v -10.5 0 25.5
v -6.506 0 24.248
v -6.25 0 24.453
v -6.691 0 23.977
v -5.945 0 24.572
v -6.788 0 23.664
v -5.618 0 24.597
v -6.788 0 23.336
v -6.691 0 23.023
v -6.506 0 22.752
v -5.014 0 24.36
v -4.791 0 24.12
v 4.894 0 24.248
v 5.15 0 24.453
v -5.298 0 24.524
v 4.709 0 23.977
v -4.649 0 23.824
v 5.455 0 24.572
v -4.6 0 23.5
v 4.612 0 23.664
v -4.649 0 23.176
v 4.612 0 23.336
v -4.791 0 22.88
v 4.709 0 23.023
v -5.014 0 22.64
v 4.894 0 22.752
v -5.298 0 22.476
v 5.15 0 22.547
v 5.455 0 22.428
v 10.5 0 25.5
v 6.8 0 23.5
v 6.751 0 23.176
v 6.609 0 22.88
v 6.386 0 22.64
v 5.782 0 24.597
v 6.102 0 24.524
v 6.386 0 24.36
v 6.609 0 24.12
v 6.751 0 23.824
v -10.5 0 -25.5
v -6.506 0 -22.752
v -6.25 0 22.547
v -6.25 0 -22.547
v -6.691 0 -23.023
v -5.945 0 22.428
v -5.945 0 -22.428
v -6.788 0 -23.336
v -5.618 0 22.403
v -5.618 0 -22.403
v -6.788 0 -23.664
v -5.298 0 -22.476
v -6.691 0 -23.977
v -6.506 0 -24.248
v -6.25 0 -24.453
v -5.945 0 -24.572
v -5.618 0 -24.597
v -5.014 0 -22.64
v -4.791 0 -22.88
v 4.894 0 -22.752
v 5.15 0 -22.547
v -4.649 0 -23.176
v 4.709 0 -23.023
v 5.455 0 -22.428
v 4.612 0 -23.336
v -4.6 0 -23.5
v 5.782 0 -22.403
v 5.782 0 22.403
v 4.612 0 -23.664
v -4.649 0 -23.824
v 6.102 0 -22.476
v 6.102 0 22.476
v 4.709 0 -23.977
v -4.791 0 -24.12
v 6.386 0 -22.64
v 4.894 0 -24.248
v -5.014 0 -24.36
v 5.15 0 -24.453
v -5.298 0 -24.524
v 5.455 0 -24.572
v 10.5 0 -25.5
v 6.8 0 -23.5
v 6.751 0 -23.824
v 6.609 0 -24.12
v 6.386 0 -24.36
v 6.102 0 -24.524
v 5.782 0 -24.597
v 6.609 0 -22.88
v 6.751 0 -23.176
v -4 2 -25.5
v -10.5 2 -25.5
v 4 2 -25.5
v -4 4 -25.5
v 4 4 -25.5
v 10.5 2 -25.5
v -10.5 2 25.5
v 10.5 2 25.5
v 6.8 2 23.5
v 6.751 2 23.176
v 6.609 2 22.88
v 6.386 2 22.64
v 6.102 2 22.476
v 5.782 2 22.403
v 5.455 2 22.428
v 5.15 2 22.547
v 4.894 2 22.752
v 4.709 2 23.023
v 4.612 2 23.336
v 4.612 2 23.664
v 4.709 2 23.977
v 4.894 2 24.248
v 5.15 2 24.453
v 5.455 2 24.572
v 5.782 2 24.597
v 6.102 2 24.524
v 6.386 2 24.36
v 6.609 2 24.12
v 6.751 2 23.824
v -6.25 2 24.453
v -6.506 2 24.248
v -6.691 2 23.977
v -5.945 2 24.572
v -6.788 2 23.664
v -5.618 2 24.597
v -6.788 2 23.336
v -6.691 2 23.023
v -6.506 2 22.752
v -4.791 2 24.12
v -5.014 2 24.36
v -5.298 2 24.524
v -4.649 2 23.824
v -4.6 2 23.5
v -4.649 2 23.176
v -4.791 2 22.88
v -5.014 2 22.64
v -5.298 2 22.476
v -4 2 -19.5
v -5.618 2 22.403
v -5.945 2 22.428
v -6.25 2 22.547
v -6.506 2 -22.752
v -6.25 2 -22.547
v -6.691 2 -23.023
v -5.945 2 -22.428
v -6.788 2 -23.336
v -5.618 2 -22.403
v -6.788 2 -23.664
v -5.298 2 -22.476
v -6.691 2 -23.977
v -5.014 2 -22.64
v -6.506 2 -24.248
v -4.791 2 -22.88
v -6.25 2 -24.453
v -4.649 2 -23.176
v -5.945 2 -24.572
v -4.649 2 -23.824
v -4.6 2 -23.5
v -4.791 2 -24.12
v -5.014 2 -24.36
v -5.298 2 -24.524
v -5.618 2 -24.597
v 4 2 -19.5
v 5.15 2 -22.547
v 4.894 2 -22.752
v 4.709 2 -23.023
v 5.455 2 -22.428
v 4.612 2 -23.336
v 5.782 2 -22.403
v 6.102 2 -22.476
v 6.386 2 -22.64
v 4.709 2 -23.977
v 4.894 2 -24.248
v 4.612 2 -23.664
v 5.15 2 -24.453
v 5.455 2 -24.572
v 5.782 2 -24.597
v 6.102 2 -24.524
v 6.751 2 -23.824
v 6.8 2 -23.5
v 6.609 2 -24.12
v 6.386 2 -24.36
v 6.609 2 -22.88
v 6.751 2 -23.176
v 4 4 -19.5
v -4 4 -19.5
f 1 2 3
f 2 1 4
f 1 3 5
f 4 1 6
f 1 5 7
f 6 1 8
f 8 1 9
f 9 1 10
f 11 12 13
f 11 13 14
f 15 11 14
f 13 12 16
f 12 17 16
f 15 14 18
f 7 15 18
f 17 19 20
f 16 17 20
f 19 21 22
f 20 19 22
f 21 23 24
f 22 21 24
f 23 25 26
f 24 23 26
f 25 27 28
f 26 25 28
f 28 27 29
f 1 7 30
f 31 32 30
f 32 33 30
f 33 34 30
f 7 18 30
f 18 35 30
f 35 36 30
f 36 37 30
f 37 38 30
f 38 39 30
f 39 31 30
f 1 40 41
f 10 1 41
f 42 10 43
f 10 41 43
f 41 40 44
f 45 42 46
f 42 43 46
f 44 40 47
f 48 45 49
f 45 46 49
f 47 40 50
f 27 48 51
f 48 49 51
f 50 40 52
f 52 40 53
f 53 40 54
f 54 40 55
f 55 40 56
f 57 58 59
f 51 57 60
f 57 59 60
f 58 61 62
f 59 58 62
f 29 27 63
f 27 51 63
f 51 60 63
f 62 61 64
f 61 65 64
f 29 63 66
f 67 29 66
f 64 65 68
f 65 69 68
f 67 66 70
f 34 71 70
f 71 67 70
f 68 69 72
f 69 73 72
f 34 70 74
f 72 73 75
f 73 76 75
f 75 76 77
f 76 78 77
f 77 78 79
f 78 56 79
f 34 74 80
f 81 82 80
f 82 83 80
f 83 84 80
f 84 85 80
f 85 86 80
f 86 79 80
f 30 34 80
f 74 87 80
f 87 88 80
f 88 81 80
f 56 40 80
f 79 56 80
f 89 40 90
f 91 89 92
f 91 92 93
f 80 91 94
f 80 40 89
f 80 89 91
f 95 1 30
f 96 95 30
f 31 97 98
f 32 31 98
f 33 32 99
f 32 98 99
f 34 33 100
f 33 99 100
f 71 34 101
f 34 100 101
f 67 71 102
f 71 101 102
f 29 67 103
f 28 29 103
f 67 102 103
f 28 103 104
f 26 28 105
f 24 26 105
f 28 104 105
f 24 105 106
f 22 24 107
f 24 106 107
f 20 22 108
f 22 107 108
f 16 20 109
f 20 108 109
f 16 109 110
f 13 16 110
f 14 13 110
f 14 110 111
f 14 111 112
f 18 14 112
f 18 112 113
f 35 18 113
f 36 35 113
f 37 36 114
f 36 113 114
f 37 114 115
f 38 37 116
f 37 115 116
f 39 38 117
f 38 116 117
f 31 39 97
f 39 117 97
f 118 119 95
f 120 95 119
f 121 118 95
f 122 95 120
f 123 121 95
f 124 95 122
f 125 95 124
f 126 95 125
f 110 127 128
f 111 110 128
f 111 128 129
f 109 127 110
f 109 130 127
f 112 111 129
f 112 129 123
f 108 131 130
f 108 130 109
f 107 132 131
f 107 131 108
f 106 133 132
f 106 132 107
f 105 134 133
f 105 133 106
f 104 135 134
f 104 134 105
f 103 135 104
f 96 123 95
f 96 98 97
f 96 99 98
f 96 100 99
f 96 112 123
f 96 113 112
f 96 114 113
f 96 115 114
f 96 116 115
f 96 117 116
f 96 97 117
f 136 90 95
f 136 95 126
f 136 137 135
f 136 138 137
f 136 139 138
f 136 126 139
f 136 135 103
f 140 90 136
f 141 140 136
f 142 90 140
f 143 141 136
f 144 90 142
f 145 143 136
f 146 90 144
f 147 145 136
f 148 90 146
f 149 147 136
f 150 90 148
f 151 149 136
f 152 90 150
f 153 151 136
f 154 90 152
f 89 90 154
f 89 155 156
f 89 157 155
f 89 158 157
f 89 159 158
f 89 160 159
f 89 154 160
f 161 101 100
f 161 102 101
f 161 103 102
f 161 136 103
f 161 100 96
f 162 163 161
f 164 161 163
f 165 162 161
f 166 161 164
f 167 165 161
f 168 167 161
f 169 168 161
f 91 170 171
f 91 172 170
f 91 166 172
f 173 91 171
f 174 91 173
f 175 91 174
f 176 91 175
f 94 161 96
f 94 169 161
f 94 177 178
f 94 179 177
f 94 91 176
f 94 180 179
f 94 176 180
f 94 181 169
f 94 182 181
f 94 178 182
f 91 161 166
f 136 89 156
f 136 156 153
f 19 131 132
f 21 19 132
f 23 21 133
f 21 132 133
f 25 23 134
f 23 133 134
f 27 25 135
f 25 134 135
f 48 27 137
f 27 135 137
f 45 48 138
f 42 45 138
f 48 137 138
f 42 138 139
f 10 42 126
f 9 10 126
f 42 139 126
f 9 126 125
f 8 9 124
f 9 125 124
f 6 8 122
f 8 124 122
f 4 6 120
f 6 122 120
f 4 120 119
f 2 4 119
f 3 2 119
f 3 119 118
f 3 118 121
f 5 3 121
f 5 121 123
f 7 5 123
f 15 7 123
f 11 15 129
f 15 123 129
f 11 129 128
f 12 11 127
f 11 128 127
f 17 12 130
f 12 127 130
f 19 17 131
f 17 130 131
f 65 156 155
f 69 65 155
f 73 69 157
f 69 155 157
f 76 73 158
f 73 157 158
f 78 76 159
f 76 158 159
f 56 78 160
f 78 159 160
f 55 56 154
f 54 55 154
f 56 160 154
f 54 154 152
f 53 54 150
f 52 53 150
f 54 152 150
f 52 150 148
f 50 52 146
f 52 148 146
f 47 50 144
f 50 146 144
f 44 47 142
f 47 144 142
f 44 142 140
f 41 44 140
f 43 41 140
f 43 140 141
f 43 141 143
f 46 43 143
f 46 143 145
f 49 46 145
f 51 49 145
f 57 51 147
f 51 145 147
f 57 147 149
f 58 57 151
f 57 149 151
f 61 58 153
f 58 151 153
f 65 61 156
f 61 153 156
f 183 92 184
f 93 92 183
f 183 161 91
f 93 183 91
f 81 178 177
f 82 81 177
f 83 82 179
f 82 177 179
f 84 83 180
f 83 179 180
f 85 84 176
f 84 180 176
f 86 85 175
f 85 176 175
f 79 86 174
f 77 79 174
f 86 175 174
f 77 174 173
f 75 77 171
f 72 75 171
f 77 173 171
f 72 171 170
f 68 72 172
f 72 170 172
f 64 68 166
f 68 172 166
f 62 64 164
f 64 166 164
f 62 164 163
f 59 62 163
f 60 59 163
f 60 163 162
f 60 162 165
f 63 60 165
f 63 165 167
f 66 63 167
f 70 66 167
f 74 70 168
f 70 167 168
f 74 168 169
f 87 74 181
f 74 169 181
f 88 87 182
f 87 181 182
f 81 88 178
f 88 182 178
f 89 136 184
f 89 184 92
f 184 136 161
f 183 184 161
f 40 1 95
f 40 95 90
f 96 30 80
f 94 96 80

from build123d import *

# Parameters (mm, degrees)
SKETCH1_W           = 21
SKETCH1_H           = 51
BOSS_EXTRUDE1_DEPTH = 2
SKETCH2_W           = 8
SKETCH2_H           = 6
BOSS_EXTRUDE2_DEPTH = 2
SKETCH3_R           = 1.1
CUT_EXTRUDE1_DEPTH  = 2


with BuildPart() as part:
    # Sketch1 → Boss-Extrude1 (new body)
    with BuildSketch(Plane(origin=(0, 0, 0), x_dir=(1, 0, 0), z_dir=(0, 1, 0))):
        Rectangle(SKETCH1_W, SKETCH1_H)
    extrude(amount=BOSS_EXTRUDE1_DEPTH)

    # Sketch2 → Boss-Extrude2 (add)
    with BuildSketch(Plane(origin=(0, 2, 0), x_dir=(1, 0, 0), z_dir=(0, 1, 0))):
        with Locations((0, 22.5)):
            Rectangle(SKETCH2_W, SKETCH2_H)
    extrude(amount=BOSS_EXTRUDE2_DEPTH)

    # Sketch3 → Cut-Extrude1 (cut)
    with BuildSketch(Plane(origin=(0, 2, 0), x_dir=(1, 0, 0), z_dir=(0, 1, 0))):
        with Locations((-5.7, 23.5)):
            Circle(SKETCH3_R)
        with Locations((5.7, 23.5)):
            Circle(SKETCH3_R)
        with Locations((-5.7, -23.5)):
            Circle(SKETCH3_R)
        with Locations((5.7, -23.5)):
            Circle(SKETCH3_R)
    extrude(amount=-CUT_EXTRUDE1_DEPTH, mode=Mode.SUBTRACT)


solid = part.part
